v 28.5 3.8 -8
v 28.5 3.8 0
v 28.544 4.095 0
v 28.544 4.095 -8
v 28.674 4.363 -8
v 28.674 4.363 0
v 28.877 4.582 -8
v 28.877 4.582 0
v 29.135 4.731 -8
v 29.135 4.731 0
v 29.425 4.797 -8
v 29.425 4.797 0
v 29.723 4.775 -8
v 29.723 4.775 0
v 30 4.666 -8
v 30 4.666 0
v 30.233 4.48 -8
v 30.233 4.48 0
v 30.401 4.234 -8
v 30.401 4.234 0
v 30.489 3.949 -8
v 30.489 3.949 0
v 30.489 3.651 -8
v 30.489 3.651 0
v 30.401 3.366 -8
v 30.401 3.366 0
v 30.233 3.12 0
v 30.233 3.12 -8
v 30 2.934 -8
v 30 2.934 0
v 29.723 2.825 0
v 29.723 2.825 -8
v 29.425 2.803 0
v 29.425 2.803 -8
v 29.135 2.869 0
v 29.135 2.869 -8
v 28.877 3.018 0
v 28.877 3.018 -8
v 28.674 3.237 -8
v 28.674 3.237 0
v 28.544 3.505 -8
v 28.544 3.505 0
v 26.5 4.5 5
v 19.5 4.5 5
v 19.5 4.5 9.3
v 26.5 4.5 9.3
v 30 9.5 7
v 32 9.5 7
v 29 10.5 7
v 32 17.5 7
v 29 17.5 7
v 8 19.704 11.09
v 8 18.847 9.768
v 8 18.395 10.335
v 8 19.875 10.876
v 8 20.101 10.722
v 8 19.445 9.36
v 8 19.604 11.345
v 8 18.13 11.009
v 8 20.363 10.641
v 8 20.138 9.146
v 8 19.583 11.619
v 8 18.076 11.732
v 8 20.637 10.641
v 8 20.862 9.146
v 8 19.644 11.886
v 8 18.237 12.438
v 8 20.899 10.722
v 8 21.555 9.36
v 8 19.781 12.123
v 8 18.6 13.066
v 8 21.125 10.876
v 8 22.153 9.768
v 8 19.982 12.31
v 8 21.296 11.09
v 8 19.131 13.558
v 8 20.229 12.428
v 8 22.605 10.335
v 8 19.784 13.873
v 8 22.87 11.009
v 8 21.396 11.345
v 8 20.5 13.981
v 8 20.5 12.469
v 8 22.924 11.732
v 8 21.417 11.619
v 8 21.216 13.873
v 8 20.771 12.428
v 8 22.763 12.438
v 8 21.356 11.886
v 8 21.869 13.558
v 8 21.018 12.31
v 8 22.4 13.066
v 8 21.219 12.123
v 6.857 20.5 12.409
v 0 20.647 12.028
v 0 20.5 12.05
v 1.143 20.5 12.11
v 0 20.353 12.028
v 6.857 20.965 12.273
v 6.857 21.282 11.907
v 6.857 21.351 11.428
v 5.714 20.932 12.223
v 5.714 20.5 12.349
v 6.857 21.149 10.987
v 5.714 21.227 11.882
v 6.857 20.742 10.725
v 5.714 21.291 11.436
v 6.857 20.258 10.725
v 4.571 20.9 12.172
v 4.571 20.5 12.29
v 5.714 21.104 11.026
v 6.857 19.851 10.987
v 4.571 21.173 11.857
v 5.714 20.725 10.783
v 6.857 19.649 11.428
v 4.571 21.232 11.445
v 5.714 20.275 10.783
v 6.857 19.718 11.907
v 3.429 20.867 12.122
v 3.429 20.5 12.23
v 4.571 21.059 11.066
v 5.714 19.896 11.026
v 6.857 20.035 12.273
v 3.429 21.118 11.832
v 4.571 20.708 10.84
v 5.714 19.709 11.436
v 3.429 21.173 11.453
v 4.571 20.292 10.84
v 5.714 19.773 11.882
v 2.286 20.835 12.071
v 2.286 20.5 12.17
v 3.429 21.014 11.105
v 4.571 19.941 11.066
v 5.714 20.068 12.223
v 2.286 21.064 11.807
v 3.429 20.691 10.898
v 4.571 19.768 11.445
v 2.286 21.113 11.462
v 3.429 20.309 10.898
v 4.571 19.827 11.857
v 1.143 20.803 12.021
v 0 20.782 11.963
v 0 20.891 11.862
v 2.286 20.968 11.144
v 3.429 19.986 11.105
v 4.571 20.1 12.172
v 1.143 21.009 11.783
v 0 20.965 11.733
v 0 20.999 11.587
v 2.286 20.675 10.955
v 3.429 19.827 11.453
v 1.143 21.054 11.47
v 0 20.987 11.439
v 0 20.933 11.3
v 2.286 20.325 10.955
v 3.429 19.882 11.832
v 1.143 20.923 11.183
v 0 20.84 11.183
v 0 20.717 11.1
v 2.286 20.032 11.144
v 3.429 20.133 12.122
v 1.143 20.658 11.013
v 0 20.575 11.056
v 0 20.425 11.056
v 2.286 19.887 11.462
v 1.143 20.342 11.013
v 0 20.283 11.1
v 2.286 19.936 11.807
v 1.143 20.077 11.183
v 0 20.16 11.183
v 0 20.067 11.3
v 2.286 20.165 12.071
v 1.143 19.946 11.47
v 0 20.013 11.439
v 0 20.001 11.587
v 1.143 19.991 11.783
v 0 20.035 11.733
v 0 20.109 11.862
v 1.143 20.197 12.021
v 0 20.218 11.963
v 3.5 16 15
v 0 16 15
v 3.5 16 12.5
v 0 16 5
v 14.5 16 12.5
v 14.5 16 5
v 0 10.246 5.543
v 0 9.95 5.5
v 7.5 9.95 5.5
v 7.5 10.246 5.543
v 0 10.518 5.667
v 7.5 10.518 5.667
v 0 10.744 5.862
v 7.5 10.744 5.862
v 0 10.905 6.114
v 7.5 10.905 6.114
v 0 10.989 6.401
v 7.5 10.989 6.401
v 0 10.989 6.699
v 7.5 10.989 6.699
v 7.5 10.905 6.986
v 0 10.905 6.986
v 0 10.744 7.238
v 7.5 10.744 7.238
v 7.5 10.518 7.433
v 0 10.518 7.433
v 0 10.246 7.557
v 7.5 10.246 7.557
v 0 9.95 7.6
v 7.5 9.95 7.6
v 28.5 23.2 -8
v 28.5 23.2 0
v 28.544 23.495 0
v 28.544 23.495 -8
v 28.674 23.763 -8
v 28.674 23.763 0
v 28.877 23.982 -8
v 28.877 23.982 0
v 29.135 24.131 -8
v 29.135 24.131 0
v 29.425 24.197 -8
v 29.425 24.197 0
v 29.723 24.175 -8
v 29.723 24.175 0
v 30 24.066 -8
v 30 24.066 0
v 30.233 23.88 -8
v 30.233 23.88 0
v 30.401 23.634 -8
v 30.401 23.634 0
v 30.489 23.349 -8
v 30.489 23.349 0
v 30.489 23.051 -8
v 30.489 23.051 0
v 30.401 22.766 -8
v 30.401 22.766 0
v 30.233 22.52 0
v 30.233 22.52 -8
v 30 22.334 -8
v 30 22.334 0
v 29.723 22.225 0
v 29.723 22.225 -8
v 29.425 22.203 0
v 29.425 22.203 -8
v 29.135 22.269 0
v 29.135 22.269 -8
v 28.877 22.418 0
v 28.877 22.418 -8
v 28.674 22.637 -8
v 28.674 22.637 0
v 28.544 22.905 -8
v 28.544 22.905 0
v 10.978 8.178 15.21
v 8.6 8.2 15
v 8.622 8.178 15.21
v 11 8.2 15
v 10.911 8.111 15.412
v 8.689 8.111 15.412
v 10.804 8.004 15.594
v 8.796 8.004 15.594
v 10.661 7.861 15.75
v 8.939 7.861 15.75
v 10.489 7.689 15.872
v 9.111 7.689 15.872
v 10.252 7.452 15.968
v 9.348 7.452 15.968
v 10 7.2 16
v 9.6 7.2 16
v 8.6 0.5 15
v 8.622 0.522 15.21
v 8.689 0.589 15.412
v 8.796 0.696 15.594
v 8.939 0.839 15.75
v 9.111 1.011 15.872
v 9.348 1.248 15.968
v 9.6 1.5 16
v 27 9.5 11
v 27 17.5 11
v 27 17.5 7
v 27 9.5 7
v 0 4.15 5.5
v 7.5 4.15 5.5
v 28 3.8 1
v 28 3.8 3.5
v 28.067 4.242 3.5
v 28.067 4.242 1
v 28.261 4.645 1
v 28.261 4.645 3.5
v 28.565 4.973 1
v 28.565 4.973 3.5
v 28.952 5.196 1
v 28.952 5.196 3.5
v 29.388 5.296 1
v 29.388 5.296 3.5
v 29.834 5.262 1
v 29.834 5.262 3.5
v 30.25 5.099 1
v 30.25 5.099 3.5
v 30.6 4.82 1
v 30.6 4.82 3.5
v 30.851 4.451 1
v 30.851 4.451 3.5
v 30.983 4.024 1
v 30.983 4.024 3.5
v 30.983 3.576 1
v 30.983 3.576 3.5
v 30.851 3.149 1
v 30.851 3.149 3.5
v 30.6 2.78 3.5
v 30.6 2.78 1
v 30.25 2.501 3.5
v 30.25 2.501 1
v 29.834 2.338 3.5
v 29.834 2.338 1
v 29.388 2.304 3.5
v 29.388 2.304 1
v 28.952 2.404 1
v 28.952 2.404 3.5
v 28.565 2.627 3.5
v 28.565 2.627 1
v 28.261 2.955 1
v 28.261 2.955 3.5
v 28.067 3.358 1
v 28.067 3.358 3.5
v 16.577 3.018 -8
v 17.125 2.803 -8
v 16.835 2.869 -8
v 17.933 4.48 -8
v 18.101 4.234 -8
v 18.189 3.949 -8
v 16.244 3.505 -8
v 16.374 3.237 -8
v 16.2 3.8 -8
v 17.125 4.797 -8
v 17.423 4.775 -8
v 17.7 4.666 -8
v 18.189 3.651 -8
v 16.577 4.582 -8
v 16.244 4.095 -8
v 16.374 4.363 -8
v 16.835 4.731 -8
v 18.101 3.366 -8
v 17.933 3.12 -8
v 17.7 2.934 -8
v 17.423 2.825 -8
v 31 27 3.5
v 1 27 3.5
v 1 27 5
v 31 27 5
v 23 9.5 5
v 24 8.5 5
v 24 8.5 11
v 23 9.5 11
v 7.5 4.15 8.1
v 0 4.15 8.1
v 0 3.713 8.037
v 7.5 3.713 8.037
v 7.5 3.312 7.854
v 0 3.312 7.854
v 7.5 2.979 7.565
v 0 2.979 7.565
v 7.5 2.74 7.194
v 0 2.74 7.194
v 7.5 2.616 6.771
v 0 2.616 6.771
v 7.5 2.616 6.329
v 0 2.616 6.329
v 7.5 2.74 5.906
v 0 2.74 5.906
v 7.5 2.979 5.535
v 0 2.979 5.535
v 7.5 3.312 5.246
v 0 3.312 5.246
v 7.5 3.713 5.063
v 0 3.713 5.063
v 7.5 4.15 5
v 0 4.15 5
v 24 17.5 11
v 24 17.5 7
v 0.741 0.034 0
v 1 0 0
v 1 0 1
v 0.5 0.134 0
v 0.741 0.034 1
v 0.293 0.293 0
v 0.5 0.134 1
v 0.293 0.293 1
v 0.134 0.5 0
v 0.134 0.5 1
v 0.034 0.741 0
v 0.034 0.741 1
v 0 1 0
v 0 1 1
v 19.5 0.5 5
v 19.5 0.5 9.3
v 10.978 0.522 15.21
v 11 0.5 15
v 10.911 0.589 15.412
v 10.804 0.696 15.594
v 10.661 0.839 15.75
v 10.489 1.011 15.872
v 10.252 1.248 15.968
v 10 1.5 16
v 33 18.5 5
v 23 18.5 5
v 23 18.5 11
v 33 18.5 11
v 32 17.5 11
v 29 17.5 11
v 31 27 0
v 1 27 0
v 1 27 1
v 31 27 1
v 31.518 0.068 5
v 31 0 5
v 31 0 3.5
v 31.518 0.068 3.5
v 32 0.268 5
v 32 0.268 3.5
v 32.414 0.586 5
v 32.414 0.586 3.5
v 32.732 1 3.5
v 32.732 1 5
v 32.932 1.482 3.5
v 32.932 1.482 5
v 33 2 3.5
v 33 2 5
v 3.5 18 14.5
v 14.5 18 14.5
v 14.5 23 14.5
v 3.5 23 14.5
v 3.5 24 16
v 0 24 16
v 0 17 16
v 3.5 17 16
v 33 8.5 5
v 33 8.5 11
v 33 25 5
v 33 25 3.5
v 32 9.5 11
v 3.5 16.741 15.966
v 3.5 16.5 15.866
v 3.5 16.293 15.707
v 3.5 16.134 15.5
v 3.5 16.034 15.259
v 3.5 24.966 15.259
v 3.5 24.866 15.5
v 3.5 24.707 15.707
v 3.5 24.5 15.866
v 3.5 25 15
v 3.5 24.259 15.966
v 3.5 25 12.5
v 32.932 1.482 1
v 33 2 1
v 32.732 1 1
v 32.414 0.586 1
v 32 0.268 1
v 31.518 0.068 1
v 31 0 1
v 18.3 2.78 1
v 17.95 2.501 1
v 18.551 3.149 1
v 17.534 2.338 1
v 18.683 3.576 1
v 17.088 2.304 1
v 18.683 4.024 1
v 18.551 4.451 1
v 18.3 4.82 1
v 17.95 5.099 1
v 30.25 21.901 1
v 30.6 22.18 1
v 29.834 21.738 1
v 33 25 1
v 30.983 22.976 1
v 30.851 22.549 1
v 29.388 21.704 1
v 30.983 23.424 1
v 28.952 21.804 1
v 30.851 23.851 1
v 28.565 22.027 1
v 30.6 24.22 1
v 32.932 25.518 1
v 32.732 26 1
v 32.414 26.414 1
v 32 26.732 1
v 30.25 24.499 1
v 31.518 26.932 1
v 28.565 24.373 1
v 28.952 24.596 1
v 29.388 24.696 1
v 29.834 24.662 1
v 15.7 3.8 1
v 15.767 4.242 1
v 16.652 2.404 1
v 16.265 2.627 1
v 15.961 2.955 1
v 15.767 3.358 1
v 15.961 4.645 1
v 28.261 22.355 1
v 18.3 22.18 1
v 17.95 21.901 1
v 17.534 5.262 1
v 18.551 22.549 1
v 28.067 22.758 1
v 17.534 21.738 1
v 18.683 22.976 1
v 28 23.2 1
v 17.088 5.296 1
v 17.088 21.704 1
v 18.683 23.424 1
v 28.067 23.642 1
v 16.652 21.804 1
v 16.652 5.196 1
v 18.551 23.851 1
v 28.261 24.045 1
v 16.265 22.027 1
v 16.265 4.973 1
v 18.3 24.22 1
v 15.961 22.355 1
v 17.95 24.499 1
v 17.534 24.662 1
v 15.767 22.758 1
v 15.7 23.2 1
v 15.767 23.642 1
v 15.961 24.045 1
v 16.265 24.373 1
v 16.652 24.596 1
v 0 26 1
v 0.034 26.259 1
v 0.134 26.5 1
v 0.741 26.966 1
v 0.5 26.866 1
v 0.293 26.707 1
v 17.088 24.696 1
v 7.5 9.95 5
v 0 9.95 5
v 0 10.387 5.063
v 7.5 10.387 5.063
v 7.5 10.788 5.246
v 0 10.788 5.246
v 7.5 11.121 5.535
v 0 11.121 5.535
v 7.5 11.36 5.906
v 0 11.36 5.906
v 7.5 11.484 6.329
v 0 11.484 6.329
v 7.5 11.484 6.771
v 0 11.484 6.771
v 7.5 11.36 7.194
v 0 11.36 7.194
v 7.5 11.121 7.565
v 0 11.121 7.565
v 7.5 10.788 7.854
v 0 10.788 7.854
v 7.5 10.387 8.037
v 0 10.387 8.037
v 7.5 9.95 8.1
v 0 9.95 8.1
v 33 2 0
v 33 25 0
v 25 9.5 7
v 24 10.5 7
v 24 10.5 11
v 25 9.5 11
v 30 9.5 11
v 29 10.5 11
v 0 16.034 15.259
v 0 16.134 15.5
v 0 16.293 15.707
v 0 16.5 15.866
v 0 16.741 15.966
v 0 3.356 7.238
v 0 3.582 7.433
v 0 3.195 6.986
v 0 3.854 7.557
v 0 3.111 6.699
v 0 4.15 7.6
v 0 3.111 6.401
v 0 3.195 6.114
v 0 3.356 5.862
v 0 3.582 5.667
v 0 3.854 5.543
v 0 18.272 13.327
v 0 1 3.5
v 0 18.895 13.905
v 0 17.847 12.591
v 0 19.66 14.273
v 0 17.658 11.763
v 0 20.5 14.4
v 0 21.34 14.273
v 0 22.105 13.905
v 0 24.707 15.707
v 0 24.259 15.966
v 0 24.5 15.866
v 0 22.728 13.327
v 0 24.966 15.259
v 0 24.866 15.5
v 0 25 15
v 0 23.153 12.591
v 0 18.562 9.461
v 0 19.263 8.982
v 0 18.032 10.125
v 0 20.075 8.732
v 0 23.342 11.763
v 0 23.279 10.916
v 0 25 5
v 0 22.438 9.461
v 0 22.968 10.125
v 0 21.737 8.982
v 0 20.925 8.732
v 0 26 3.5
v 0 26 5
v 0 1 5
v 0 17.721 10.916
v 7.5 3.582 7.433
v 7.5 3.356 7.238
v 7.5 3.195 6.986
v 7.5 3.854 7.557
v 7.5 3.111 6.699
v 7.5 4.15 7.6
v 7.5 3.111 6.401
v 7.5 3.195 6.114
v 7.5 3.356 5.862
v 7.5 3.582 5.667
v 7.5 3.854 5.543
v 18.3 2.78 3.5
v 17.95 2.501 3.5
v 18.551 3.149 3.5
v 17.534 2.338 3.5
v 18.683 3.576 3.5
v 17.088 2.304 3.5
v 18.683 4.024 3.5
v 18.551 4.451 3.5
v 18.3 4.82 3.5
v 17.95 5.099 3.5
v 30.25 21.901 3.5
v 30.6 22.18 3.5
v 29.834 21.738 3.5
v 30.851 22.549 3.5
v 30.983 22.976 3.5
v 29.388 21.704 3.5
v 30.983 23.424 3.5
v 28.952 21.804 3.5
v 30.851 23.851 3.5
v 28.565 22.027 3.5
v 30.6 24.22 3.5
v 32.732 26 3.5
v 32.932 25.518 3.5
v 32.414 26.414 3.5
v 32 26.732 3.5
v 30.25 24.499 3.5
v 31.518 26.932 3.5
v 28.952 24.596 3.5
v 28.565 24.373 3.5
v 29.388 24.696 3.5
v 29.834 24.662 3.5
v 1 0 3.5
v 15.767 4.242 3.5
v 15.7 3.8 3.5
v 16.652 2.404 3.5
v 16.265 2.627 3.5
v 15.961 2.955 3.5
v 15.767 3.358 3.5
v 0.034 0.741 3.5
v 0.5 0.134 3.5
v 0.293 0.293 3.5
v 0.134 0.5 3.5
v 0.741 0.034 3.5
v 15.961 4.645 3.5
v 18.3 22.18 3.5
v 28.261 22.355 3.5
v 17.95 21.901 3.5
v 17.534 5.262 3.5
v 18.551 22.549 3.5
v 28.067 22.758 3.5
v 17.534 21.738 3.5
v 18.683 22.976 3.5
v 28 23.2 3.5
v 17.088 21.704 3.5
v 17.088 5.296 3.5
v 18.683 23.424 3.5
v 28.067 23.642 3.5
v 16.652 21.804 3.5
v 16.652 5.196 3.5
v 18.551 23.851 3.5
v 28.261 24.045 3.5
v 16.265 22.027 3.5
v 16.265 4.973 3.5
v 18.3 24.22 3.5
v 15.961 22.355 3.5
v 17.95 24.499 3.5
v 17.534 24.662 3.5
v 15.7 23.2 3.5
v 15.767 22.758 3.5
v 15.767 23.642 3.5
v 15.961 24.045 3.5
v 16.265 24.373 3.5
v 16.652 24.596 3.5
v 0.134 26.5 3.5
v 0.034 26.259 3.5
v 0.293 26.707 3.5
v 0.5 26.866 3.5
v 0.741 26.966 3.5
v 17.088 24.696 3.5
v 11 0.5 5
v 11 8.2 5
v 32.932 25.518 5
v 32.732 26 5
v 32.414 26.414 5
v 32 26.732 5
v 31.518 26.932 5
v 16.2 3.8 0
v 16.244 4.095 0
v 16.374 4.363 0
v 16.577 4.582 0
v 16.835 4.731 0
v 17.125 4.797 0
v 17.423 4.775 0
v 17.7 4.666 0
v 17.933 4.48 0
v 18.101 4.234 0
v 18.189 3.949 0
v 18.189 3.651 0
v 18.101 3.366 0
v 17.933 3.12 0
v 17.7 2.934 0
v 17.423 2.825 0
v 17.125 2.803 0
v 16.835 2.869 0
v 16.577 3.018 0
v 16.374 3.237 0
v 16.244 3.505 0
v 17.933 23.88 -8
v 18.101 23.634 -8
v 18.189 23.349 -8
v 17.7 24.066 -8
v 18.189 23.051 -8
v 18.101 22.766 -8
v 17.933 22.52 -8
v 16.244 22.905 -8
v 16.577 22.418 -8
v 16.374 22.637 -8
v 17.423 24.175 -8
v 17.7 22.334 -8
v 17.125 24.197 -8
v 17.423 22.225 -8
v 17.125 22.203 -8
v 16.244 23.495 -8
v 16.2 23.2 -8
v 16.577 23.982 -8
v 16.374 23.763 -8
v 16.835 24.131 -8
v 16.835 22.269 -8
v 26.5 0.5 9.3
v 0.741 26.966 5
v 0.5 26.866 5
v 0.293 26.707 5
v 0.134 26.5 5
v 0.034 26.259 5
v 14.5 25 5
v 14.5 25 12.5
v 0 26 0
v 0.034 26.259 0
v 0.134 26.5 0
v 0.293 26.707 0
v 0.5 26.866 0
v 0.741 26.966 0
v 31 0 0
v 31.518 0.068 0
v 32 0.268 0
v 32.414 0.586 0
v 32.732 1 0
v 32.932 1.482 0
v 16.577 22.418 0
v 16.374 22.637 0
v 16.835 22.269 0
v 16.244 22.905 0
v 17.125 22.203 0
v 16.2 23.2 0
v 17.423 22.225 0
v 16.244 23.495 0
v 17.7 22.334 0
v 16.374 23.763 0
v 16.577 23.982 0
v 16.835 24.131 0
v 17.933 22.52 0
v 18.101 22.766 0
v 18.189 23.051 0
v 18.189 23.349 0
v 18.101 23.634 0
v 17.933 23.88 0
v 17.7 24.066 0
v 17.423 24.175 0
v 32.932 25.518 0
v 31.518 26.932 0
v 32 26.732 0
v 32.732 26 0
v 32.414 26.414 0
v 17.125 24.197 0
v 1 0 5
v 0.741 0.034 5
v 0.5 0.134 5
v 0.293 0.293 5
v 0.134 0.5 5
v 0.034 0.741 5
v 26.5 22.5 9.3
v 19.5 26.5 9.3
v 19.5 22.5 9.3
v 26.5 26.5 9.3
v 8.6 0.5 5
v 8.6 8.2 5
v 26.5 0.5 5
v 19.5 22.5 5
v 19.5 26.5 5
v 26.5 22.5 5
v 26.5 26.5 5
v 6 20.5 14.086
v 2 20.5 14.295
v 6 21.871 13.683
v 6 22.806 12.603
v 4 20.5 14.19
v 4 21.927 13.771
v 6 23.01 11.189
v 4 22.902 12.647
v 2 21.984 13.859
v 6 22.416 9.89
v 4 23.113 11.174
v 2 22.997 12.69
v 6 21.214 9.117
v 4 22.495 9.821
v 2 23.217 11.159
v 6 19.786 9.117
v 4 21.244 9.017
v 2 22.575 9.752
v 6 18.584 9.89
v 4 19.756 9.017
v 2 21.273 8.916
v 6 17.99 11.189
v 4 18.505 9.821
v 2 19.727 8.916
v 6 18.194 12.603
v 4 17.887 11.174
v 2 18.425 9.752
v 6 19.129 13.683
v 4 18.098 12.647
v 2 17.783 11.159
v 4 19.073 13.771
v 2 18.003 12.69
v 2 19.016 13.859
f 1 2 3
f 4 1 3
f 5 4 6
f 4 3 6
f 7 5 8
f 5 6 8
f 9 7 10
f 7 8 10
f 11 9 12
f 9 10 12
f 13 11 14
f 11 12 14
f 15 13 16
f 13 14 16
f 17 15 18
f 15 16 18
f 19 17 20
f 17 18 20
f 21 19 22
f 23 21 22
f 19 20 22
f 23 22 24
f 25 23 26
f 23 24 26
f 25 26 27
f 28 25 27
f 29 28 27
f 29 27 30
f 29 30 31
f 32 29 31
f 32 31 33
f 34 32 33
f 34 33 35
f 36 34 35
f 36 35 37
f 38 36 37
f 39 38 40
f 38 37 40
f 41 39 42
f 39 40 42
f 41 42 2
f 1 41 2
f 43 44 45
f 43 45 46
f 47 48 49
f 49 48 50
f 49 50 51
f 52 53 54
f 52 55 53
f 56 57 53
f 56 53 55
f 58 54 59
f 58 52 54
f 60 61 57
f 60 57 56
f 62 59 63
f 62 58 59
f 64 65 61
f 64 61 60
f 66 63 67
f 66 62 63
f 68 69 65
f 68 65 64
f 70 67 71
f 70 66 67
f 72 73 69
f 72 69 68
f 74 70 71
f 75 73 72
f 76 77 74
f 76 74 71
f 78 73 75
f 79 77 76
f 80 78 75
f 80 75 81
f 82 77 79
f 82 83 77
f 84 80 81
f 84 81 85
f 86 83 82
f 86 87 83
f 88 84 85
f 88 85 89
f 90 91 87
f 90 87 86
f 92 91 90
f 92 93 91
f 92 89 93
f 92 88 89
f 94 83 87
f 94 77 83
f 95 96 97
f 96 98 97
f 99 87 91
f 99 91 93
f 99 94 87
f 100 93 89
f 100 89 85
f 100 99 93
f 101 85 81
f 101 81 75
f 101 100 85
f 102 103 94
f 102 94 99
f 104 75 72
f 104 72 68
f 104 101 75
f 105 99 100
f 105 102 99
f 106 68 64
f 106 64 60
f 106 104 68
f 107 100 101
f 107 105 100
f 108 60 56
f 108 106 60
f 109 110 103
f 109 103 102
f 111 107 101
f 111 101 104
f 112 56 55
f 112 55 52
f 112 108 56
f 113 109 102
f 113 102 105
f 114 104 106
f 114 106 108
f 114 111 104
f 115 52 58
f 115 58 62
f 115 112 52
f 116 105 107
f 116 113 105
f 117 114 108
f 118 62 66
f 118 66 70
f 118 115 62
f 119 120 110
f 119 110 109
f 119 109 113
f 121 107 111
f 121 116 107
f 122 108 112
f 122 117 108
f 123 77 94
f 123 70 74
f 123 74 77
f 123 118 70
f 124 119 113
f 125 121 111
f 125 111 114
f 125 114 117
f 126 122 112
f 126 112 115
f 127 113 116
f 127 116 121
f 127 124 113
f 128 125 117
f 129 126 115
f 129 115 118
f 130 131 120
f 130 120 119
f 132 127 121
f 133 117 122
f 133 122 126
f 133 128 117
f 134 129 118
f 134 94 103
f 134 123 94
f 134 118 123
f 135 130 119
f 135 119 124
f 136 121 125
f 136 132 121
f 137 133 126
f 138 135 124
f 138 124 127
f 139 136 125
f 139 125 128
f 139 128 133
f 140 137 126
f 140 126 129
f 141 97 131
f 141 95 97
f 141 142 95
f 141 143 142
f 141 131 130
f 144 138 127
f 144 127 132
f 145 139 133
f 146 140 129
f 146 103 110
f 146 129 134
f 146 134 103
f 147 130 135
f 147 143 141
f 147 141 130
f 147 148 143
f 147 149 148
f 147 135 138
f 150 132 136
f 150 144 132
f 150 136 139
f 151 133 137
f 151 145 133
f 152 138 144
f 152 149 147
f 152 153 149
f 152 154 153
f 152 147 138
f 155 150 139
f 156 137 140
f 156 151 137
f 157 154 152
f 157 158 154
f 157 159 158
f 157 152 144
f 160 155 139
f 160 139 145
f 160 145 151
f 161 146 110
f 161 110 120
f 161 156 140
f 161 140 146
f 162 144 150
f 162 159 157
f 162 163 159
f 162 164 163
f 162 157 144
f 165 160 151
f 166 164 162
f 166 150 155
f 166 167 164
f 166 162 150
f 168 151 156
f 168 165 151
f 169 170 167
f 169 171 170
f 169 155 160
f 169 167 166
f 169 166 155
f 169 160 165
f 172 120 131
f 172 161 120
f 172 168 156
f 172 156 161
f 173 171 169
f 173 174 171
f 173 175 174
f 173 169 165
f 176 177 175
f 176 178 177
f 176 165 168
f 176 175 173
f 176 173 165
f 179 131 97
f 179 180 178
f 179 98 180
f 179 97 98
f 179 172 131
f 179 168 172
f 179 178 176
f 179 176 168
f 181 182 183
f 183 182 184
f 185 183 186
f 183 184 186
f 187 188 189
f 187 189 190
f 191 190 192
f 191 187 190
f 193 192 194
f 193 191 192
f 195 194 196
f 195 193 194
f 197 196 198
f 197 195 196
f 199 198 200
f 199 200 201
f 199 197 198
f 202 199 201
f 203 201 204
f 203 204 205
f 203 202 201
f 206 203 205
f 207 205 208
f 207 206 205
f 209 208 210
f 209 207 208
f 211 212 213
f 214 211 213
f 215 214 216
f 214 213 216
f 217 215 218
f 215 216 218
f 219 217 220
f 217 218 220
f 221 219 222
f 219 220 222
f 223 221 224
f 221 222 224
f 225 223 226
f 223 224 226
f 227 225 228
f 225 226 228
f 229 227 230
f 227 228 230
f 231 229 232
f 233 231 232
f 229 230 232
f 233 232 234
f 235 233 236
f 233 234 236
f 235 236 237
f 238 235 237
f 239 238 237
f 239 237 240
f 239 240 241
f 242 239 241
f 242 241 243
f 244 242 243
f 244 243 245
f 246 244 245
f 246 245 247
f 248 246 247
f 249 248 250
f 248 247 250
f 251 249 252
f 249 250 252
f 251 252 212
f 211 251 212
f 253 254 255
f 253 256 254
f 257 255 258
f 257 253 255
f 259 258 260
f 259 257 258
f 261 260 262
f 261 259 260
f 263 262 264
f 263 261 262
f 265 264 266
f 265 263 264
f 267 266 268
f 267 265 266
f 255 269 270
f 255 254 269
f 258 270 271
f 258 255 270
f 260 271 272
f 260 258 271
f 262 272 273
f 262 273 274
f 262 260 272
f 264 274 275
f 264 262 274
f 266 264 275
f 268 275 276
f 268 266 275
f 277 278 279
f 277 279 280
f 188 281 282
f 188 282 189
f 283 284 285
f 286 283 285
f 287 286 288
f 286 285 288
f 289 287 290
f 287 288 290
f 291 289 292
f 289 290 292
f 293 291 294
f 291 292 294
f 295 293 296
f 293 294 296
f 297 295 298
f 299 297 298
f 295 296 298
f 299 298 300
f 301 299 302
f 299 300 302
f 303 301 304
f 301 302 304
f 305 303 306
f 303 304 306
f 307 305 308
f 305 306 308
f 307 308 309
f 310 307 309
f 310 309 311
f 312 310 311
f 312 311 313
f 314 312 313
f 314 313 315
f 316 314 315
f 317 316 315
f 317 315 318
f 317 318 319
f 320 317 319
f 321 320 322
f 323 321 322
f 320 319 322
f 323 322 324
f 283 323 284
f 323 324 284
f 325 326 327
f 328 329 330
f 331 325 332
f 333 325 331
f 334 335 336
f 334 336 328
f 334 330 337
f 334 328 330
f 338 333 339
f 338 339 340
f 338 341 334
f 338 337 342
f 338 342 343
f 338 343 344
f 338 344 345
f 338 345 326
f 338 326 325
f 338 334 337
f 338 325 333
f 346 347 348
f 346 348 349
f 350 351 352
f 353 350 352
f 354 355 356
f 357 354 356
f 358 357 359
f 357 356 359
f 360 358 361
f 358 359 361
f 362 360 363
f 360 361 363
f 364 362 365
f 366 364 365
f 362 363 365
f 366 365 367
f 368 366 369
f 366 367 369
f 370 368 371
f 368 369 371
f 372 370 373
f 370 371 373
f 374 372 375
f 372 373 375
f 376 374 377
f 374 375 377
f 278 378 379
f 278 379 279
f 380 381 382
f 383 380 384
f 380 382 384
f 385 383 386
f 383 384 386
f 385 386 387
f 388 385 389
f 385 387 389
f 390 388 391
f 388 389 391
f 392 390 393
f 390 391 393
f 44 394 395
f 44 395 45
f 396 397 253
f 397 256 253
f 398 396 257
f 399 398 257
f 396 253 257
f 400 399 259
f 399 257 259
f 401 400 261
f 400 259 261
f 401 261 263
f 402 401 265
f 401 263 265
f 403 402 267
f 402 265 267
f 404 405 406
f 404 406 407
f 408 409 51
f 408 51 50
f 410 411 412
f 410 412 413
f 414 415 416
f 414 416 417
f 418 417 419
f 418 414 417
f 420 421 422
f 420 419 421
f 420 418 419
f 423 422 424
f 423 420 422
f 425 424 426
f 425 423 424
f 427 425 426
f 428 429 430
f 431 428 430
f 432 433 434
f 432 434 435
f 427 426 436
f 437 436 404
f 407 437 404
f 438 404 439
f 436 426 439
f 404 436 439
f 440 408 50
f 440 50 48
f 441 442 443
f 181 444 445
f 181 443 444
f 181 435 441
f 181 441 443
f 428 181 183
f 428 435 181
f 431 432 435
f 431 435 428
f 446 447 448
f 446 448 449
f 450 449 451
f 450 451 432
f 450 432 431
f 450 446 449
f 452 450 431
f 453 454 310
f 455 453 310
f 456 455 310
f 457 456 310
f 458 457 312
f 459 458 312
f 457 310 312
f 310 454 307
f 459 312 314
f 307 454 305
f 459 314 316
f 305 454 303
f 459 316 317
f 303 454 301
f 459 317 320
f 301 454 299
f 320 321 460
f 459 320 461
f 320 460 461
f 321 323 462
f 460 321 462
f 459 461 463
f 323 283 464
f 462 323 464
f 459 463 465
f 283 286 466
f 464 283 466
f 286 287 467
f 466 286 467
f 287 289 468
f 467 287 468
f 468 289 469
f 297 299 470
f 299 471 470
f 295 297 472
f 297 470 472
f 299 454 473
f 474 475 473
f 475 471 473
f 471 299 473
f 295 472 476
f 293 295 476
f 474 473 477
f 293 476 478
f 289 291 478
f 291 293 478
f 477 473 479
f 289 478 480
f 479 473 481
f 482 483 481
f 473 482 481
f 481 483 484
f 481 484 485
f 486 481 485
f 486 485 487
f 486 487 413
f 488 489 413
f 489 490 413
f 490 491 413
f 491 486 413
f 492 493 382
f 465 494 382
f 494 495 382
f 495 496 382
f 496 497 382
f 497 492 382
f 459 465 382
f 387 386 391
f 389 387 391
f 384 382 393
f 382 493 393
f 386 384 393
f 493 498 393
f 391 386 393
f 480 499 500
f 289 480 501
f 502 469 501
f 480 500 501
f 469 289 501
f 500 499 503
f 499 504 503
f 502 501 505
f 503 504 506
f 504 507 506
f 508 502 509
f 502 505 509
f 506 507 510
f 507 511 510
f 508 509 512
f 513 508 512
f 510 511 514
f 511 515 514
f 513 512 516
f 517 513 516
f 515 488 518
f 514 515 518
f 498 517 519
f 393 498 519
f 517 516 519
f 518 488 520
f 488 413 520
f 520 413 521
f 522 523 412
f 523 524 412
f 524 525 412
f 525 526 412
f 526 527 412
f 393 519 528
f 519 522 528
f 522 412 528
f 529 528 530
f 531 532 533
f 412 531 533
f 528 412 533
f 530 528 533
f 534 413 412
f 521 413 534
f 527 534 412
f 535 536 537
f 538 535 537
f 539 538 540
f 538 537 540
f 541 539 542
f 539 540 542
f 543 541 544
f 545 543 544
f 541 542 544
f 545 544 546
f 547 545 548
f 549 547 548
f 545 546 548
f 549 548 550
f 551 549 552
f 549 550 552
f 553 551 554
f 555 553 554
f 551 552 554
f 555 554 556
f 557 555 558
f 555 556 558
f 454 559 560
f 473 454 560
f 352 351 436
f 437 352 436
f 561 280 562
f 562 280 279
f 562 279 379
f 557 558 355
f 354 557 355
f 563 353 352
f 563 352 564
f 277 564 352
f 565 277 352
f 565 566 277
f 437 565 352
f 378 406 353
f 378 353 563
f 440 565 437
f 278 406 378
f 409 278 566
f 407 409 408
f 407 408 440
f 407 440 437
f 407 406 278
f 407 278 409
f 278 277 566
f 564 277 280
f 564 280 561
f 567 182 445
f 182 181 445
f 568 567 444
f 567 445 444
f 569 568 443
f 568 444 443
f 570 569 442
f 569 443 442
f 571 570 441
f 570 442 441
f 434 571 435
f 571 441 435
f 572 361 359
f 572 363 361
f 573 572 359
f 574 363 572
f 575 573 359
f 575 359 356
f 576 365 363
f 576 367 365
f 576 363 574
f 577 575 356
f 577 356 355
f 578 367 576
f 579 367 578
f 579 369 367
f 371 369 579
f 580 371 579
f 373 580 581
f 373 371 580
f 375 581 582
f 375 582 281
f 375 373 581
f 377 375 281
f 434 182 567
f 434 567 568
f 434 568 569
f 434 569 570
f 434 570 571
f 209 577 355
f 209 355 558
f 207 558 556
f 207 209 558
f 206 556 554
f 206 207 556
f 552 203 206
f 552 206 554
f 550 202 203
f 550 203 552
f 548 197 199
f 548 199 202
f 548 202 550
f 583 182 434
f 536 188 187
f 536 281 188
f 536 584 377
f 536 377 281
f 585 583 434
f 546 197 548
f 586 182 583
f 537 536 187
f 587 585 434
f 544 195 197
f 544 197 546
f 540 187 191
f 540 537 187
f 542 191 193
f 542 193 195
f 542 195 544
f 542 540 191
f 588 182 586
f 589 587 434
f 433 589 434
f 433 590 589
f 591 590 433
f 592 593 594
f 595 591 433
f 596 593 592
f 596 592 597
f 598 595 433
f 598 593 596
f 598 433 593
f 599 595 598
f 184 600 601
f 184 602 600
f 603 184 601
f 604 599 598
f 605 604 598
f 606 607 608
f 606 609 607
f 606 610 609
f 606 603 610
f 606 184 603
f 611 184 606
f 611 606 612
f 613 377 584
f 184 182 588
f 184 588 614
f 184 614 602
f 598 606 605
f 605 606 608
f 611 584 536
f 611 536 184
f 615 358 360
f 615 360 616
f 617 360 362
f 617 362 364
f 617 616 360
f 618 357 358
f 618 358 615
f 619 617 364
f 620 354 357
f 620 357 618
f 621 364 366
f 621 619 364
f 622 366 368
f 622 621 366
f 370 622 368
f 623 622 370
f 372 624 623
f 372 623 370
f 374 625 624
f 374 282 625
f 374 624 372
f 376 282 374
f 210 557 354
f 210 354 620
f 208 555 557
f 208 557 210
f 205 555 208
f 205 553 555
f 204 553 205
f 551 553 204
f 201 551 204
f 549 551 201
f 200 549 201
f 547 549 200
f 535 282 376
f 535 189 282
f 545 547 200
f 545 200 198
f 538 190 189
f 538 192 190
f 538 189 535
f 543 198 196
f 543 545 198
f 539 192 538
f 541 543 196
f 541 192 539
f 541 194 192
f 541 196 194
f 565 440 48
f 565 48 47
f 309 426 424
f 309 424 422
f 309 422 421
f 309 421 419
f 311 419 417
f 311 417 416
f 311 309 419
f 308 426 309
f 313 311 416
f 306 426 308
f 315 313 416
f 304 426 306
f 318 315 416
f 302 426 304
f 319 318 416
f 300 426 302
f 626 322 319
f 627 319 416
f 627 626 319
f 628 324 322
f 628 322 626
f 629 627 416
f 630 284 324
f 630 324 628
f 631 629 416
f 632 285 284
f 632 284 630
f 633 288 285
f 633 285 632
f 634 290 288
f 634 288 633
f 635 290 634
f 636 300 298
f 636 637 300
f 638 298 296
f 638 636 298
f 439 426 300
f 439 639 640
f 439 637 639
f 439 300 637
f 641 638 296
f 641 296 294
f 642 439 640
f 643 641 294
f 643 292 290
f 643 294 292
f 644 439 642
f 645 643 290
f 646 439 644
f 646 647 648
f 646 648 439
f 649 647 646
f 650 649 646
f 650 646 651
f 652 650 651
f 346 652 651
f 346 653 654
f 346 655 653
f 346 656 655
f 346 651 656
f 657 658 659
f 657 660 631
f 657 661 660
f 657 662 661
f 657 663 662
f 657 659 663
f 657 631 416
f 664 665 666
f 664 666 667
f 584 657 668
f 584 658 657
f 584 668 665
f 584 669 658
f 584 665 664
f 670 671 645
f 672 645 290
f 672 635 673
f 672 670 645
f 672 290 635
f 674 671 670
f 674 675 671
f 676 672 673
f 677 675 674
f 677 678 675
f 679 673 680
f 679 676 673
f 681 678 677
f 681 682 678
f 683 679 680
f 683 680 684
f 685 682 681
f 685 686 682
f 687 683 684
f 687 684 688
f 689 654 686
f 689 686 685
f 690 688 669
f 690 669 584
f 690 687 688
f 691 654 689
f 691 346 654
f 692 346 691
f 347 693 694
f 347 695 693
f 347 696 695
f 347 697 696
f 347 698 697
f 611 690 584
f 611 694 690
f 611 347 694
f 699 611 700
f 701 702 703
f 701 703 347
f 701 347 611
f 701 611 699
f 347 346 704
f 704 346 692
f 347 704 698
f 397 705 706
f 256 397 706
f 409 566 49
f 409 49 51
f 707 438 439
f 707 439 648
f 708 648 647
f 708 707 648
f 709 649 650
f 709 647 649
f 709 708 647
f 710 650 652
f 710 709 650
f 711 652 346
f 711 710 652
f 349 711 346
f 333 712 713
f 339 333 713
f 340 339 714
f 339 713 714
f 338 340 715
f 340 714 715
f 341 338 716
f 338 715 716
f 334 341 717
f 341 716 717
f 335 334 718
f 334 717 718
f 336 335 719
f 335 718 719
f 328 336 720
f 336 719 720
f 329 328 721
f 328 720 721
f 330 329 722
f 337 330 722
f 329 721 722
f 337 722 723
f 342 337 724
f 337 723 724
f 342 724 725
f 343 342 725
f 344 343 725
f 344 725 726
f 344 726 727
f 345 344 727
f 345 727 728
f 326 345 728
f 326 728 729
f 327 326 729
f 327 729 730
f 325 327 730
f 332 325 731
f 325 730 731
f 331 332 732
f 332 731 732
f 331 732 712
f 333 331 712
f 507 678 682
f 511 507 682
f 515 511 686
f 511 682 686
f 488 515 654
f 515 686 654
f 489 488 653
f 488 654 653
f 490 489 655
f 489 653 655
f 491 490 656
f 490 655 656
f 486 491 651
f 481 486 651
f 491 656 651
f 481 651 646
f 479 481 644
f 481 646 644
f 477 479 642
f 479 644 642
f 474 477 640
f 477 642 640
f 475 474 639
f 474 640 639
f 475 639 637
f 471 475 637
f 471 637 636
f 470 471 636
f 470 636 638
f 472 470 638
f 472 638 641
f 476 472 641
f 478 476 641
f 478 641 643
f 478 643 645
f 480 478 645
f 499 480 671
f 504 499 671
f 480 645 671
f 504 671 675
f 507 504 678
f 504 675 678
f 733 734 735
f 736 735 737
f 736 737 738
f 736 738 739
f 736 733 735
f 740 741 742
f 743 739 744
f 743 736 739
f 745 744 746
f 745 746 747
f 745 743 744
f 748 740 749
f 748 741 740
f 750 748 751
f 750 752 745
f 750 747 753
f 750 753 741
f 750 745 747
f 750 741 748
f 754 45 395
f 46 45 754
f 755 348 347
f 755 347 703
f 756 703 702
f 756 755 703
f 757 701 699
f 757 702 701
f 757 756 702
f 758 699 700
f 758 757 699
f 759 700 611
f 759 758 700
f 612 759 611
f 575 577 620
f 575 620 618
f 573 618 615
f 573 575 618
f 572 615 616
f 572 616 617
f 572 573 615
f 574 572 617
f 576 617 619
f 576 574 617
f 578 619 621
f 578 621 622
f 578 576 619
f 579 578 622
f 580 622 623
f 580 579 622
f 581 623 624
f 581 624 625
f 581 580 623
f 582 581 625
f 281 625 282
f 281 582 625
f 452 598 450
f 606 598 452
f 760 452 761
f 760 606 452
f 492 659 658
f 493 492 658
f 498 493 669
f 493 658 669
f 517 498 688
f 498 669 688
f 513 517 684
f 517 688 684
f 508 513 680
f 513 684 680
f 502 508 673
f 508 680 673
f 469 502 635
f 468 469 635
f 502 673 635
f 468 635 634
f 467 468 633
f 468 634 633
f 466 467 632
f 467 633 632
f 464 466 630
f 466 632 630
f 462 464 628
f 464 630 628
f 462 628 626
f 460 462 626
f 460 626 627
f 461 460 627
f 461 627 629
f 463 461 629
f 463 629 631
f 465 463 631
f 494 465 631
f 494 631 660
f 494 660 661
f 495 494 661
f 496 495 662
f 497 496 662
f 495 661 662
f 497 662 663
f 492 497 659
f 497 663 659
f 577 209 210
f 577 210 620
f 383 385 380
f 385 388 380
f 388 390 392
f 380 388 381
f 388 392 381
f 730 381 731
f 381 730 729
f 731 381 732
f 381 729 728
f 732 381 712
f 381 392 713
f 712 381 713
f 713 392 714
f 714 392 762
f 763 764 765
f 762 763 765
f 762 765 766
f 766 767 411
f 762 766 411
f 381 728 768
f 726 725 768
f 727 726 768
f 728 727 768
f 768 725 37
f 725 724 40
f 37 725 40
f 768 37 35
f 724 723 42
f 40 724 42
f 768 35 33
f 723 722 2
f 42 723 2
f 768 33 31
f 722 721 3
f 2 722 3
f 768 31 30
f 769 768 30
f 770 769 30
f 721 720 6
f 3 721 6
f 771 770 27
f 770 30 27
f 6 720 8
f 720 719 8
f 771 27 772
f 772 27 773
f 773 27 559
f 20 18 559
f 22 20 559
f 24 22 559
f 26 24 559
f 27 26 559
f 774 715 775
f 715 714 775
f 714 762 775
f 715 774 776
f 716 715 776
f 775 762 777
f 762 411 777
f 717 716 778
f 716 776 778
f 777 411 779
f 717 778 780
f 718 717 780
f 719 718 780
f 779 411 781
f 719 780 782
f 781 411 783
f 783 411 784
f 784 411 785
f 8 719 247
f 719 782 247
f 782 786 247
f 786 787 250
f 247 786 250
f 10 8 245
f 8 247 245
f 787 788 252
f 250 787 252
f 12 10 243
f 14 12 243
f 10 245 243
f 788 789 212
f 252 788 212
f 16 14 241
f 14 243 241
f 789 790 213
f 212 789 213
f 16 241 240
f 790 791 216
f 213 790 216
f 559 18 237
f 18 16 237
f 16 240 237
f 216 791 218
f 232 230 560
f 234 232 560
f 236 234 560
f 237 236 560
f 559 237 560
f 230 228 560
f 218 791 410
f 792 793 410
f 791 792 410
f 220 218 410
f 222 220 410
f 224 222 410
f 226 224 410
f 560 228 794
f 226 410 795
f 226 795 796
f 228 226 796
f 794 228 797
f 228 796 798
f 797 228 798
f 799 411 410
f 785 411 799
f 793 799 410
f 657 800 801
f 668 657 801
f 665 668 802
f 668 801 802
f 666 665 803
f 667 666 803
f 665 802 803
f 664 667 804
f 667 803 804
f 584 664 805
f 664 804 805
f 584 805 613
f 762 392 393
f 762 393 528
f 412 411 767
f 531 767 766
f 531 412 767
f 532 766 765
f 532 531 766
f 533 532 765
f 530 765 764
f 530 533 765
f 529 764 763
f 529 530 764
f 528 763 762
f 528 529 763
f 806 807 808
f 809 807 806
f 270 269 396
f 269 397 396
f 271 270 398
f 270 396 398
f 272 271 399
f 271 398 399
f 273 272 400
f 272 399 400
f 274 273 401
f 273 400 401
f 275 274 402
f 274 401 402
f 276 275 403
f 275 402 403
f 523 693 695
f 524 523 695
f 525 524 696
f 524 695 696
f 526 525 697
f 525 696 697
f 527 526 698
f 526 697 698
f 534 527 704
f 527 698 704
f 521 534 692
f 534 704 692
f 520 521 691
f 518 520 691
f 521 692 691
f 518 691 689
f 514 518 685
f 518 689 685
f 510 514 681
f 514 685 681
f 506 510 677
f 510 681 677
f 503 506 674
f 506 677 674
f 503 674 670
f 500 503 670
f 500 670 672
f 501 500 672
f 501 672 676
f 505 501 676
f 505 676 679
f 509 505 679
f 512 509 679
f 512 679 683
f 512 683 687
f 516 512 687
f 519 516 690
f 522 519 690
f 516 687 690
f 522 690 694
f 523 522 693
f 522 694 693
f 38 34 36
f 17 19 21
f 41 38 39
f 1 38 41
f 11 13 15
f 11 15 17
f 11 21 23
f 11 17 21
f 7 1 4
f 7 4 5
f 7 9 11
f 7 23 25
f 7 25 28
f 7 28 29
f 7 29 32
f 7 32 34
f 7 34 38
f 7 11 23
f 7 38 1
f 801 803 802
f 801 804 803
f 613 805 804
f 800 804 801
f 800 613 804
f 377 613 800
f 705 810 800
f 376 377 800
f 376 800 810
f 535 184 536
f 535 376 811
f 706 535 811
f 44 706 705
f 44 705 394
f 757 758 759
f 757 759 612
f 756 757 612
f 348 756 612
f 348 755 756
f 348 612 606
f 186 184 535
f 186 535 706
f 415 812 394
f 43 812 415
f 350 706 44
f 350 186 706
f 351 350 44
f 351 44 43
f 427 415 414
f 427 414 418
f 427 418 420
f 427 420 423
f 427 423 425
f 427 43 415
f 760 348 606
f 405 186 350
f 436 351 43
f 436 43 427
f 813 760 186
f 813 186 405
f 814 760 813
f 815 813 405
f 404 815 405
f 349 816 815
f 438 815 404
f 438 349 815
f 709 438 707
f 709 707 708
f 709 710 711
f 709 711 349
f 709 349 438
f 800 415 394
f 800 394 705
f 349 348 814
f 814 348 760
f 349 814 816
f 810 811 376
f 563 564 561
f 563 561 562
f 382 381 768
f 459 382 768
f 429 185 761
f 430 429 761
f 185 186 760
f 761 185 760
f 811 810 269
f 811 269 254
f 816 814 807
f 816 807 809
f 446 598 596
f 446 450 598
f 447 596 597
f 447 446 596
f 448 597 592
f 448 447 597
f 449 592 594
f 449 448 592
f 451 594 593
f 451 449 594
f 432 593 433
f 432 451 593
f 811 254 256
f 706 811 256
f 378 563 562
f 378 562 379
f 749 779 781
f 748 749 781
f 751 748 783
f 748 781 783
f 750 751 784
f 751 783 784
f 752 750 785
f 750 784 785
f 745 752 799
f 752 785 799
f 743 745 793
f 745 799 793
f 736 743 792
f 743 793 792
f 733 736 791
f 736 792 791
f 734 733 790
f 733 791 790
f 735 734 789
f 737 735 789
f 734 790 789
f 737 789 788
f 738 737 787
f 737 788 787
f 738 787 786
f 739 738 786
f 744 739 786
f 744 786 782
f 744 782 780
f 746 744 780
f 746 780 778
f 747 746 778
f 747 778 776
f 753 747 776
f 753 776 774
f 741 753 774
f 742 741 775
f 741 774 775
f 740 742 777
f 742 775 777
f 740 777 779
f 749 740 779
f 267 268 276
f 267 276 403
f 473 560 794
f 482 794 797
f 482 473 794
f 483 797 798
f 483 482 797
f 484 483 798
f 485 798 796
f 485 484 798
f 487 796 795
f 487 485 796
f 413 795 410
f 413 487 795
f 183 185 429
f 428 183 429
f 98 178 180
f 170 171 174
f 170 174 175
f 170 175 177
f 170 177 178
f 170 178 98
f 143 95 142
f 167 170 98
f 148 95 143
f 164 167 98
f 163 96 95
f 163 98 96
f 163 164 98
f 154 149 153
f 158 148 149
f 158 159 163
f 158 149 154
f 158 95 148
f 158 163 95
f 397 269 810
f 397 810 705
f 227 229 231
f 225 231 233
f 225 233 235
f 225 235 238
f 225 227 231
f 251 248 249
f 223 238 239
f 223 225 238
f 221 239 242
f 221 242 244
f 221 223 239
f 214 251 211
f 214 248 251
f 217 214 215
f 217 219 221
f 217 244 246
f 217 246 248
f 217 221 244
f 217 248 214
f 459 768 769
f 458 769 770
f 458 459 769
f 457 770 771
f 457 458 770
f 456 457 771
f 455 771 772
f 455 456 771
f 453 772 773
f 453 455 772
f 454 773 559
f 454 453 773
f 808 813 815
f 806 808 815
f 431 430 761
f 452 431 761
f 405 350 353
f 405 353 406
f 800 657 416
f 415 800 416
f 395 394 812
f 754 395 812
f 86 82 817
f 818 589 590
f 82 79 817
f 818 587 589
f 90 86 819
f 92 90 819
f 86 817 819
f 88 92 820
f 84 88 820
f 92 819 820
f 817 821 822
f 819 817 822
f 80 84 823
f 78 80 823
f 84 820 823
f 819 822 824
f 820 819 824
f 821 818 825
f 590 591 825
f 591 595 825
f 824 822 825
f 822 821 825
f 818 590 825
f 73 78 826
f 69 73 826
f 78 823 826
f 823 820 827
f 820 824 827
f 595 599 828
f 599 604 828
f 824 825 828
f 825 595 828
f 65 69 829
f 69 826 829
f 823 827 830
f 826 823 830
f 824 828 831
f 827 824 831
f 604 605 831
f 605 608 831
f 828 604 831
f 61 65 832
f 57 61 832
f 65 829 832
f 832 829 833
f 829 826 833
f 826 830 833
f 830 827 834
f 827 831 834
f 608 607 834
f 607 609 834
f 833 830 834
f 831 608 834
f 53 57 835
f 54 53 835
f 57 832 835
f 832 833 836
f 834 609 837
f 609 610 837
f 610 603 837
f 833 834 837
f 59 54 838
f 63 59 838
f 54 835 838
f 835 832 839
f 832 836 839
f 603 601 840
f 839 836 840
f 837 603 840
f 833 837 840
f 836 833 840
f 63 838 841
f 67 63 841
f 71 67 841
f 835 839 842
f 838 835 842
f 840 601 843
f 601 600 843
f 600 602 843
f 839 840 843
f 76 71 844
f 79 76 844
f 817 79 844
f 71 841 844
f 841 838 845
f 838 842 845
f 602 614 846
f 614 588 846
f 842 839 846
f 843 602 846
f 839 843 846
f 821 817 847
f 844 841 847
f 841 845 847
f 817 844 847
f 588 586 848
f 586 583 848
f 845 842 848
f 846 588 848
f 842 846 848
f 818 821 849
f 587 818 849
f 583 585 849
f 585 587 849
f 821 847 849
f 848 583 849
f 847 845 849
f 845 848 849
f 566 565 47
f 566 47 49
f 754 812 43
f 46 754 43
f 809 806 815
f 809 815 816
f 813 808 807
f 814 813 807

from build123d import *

# Parameters (mm, degrees)
SKETCH_1_W          = 33
SKETCH_1_H          = 27
EXTRUDE_1_DEPTH     = 5
FILLET_1_R          = 2
SKETCH_2_R          = 1
EXTRUDE_2_DEPTH     = 8
SKETCH_3_W          = 10
SKETCH_3_H          = 10
EXTRUDE_3_DEPTH     = 6
CHAMFER_1_SIZE      = 1
CUT_EXTRUDE_1_DEPTH = 4
SKETCH_5_W          = 14.5
SKETCH_5_H          = 9
SKETCH_5_W_2        = 2.4
SKETCH_5_H_2        = 7.7
EXTRUDE_4_DEPTH     = 11
SKETCH_6_R          = 2.85
SKETCH_6_R_2        = 0.5
CUT_EXTRUDE_2_DEPTH = 8
CUT_EXTRUDE_2_DRAFT = -3
CUT_EXTRUDE_3_DEPTH = 11
EXTRUDE_5_DEPTH     = 7.5
SKETCH_9_W          = 7
SKETCH_9_H          = 4
EXTRUDE_6_DEPTH     = 4.3
FILLET_2_R          = 1
CUT_EXTRUDE_START   = -3.5
SKETCH_10_R         = 1.5
CUT_EXTRUDE_4_DEPTH = 2.5


with BuildPart() as part:
    # 草图1 → 凸台-拉伸1 (new body)
    with BuildSketch(Plane.XY):
        with Locations((16.5, 13.5)):
            Rectangle(SKETCH_1_W, SKETCH_1_H)
    extrude(amount=EXTRUDE_1_DEPTH)

    # 圆角1
    fillet_1_edges = [part.edges().sort_by_distance(p)[0] for p in [
        (33, 27, 2.5),
        (33, 0, 2.5),
    ]]
    fillet(fillet_1_edges, radius=FILLET_1_R)

    # 草图2 → 凸台-拉伸2 (add)
    with BuildSketch(Plane(origin=(0, 0, 0), x_dir=(-1, 0, 0), z_dir=(0, 0, -1))):
        with Locations((-17.2, 23.2)):
            Circle(SKETCH_2_R)
        with Locations((-29.5, 23.2)):
            Circle(SKETCH_2_R)
        with Locations((-29.5, 3.8)):
            Circle(SKETCH_2_R)
        with Locations((-17.2, 3.8)):
            Circle(SKETCH_2_R)
    extrude(amount=EXTRUDE_2_DEPTH)

    # 草图3 → 凸台-拉伸3 (add)
    with BuildSketch(Plane.XY.offset(5)):
        with Locations((28, 13.5)):
            Rectangle(SKETCH_3_W, SKETCH_3_H)
    extrude(amount=EXTRUDE_3_DEPTH)

    # 倒角1
    chamfer_1_edges = [part.edges().sort_by_distance(p)[0] for p in [
        (23, 8.5, 8),
    ]]
    chamfer(chamfer_1_edges, length=CHAMFER_1_SIZE)

    # 草图4 → 切除-拉伸1 (cut)
    with BuildSketch(Plane.XY.offset(11)):
        Polygon((24, 17.5), (27, 17.5), (27, 9.5), (25, 9.5), (24, 10.5), align=None)
        Polygon((29, 17.5), (32, 17.5), (32, 9.5), (30, 9.5), (29, 10.5), align=None)
    extrude(amount=-CUT_EXTRUDE_1_DEPTH, mode=Mode.SUBTRACT)

    # 草图5 → 凸台-拉伸4 (add)
    with BuildSketch(Plane.XY.offset(5)):
        with Locations((7.25, 20.5)):
            Rectangle(SKETCH_5_W, SKETCH_5_H)
        with Locations((9.8, 4.35)):
            Rectangle(SKETCH_5_W_2, SKETCH_5_H_2)
    extrude(amount=EXTRUDE_4_DEPTH)


with BuildPart() as cut_extrude_2_tool:
    # 草图6 → 切除-拉伸2 (with draft: the straight prism first)
    with BuildSketch(Plane.ZY):
        with Locations((11.55, 20.5)):
            Circle(SKETCH_6_R)
        with Locations((11.55, 20.5)):
            Circle(SKETCH_6_R_2, mode=Mode.SUBTRACT)
    extrude(amount=-CUT_EXTRUDE_2_DEPTH)
    # 切除-拉伸2: the draft: its side faces are tilted about the plane it starts from
    cut_extrude_2_sides = [cut_extrude_2_tool.faces().sort_by_distance(p)[0] for p in [
        (4, 20.5, 8.7),
        (4, 20.5, 11.05),
    ]]
    draft(cut_extrude_2_sides, Plane.ZY, CUT_EXTRUDE_2_DRAFT)


with BuildPart() as part_1:
    add(part.part)

    # 切除-拉伸2: cut by cut_extrude_2_tool
    add(cut_extrude_2_tool.part, mode=Mode.SUBTRACT)

    # 草图7 → 切除-拉伸3 (cut)
    with BuildSketch(Plane(origin=(14.5, 0, 0), x_dir=(0, 0, -1), z_dir=(1, 0, 0))):
        Polygon((-14.5, 18), (-14.5, 23), (-12.5, 25), (-16, 25), (-16, 16), (-12.5, 16), align=None)
    extrude(amount=-CUT_EXTRUDE_3_DEPTH, mode=Mode.SUBTRACT)

    # 草图8 → 凸台-拉伸5 (add)
    with BuildSketch(Plane.ZY):
        with BuildLine():
            Line((8.1, 9.95), (8.1, 4.15))
            ThreePointArc((8.1, 4.15), (6.55, 2.6), (5, 4.15))
            Line((5, 4.15), (5, 9.95))
            ThreePointArc((5, 9.95), (6.55, 11.5), (8.1, 9.95))
        make_face()
        with BuildLine():
            Line((7.6, 9.95), (7.6, 4.15))
            ThreePointArc((7.6, 4.15), (6.55, 3.1), (5.5, 4.15))
            Line((5.5, 4.15), (5.5, 9.95))
            ThreePointArc((5.5, 9.95), (6.55, 11), (7.6, 9.95))
        make_face(mode=Mode.SUBTRACT)
    extrude(amount=-EXTRUDE_5_DEPTH)

    # 草图9 → 凸台-拉伸6 (add)
    with BuildSketch(Plane.XY.offset(5)):
        with Locations((23, 24.5)):
            Rectangle(SKETCH_9_W, SKETCH_9_H)
        with Locations((23, 2.5)):
            Rectangle(SKETCH_9_W, SKETCH_9_H)
    extrude(amount=EXTRUDE_6_DEPTH)

    # 圆角2
    fillet_2_edges = [part_1.edges().sort_by_distance(p)[0] for p in [
        (1.75, 16, 16),
        (8.6, 4.35, 16),
        (9.8, 0.5, 16),
        (11, 4.35, 16),
        (9.8, 8.2, 16),
        (1.75, 25, 16),
        (0, 27, 2.5),
        (0, 0, 2.5),
    ]]
    fillet(fillet_2_edges, radius=FILLET_2_R)

    # 草图10 → 切除-拉伸4 (cut)
    with BuildSketch(Plane(origin=(0, 0, 0), x_dir=(-1, 0, 0), z_dir=(0, 0, -1)).offset(CUT_EXTRUDE_START)):
        with BuildLine():
            ThreePointArc((-33, 2), (-32.414213562, 0.585786438), (-31, 0))
            Line((-31, 0), (-1, 0))
            ThreePointArc((-1, 0), (-0.292893219, 0.292893219), (0, 1))
            Line((0, 1), (0, 26))
            ThreePointArc((0, 26), (-0.292893219, 26.707106781), (-1, 27))
            Line((-1, 27), (-31, 27))
            ThreePointArc((-31, 27), (-32.414213562, 26.414213562), (-33, 25))
            Line((-33, 25), (-33, 2))
        make_face()
        with Locations((-17.2, 3.8)):
            Circle(SKETCH_10_R, mode=Mode.SUBTRACT)
        with Locations((-29.5, 3.8)):
            Circle(SKETCH_10_R, mode=Mode.SUBTRACT)
        with Locations((-17.2, 23.2)):
            Circle(SKETCH_10_R, mode=Mode.SUBTRACT)
        with Locations((-29.5, 23.2)):
            Circle(SKETCH_10_R, mode=Mode.SUBTRACT)
    extrude(amount=CUT_EXTRUDE_4_DEPTH, mode=Mode.SUBTRACT)


solid = part_1.part
